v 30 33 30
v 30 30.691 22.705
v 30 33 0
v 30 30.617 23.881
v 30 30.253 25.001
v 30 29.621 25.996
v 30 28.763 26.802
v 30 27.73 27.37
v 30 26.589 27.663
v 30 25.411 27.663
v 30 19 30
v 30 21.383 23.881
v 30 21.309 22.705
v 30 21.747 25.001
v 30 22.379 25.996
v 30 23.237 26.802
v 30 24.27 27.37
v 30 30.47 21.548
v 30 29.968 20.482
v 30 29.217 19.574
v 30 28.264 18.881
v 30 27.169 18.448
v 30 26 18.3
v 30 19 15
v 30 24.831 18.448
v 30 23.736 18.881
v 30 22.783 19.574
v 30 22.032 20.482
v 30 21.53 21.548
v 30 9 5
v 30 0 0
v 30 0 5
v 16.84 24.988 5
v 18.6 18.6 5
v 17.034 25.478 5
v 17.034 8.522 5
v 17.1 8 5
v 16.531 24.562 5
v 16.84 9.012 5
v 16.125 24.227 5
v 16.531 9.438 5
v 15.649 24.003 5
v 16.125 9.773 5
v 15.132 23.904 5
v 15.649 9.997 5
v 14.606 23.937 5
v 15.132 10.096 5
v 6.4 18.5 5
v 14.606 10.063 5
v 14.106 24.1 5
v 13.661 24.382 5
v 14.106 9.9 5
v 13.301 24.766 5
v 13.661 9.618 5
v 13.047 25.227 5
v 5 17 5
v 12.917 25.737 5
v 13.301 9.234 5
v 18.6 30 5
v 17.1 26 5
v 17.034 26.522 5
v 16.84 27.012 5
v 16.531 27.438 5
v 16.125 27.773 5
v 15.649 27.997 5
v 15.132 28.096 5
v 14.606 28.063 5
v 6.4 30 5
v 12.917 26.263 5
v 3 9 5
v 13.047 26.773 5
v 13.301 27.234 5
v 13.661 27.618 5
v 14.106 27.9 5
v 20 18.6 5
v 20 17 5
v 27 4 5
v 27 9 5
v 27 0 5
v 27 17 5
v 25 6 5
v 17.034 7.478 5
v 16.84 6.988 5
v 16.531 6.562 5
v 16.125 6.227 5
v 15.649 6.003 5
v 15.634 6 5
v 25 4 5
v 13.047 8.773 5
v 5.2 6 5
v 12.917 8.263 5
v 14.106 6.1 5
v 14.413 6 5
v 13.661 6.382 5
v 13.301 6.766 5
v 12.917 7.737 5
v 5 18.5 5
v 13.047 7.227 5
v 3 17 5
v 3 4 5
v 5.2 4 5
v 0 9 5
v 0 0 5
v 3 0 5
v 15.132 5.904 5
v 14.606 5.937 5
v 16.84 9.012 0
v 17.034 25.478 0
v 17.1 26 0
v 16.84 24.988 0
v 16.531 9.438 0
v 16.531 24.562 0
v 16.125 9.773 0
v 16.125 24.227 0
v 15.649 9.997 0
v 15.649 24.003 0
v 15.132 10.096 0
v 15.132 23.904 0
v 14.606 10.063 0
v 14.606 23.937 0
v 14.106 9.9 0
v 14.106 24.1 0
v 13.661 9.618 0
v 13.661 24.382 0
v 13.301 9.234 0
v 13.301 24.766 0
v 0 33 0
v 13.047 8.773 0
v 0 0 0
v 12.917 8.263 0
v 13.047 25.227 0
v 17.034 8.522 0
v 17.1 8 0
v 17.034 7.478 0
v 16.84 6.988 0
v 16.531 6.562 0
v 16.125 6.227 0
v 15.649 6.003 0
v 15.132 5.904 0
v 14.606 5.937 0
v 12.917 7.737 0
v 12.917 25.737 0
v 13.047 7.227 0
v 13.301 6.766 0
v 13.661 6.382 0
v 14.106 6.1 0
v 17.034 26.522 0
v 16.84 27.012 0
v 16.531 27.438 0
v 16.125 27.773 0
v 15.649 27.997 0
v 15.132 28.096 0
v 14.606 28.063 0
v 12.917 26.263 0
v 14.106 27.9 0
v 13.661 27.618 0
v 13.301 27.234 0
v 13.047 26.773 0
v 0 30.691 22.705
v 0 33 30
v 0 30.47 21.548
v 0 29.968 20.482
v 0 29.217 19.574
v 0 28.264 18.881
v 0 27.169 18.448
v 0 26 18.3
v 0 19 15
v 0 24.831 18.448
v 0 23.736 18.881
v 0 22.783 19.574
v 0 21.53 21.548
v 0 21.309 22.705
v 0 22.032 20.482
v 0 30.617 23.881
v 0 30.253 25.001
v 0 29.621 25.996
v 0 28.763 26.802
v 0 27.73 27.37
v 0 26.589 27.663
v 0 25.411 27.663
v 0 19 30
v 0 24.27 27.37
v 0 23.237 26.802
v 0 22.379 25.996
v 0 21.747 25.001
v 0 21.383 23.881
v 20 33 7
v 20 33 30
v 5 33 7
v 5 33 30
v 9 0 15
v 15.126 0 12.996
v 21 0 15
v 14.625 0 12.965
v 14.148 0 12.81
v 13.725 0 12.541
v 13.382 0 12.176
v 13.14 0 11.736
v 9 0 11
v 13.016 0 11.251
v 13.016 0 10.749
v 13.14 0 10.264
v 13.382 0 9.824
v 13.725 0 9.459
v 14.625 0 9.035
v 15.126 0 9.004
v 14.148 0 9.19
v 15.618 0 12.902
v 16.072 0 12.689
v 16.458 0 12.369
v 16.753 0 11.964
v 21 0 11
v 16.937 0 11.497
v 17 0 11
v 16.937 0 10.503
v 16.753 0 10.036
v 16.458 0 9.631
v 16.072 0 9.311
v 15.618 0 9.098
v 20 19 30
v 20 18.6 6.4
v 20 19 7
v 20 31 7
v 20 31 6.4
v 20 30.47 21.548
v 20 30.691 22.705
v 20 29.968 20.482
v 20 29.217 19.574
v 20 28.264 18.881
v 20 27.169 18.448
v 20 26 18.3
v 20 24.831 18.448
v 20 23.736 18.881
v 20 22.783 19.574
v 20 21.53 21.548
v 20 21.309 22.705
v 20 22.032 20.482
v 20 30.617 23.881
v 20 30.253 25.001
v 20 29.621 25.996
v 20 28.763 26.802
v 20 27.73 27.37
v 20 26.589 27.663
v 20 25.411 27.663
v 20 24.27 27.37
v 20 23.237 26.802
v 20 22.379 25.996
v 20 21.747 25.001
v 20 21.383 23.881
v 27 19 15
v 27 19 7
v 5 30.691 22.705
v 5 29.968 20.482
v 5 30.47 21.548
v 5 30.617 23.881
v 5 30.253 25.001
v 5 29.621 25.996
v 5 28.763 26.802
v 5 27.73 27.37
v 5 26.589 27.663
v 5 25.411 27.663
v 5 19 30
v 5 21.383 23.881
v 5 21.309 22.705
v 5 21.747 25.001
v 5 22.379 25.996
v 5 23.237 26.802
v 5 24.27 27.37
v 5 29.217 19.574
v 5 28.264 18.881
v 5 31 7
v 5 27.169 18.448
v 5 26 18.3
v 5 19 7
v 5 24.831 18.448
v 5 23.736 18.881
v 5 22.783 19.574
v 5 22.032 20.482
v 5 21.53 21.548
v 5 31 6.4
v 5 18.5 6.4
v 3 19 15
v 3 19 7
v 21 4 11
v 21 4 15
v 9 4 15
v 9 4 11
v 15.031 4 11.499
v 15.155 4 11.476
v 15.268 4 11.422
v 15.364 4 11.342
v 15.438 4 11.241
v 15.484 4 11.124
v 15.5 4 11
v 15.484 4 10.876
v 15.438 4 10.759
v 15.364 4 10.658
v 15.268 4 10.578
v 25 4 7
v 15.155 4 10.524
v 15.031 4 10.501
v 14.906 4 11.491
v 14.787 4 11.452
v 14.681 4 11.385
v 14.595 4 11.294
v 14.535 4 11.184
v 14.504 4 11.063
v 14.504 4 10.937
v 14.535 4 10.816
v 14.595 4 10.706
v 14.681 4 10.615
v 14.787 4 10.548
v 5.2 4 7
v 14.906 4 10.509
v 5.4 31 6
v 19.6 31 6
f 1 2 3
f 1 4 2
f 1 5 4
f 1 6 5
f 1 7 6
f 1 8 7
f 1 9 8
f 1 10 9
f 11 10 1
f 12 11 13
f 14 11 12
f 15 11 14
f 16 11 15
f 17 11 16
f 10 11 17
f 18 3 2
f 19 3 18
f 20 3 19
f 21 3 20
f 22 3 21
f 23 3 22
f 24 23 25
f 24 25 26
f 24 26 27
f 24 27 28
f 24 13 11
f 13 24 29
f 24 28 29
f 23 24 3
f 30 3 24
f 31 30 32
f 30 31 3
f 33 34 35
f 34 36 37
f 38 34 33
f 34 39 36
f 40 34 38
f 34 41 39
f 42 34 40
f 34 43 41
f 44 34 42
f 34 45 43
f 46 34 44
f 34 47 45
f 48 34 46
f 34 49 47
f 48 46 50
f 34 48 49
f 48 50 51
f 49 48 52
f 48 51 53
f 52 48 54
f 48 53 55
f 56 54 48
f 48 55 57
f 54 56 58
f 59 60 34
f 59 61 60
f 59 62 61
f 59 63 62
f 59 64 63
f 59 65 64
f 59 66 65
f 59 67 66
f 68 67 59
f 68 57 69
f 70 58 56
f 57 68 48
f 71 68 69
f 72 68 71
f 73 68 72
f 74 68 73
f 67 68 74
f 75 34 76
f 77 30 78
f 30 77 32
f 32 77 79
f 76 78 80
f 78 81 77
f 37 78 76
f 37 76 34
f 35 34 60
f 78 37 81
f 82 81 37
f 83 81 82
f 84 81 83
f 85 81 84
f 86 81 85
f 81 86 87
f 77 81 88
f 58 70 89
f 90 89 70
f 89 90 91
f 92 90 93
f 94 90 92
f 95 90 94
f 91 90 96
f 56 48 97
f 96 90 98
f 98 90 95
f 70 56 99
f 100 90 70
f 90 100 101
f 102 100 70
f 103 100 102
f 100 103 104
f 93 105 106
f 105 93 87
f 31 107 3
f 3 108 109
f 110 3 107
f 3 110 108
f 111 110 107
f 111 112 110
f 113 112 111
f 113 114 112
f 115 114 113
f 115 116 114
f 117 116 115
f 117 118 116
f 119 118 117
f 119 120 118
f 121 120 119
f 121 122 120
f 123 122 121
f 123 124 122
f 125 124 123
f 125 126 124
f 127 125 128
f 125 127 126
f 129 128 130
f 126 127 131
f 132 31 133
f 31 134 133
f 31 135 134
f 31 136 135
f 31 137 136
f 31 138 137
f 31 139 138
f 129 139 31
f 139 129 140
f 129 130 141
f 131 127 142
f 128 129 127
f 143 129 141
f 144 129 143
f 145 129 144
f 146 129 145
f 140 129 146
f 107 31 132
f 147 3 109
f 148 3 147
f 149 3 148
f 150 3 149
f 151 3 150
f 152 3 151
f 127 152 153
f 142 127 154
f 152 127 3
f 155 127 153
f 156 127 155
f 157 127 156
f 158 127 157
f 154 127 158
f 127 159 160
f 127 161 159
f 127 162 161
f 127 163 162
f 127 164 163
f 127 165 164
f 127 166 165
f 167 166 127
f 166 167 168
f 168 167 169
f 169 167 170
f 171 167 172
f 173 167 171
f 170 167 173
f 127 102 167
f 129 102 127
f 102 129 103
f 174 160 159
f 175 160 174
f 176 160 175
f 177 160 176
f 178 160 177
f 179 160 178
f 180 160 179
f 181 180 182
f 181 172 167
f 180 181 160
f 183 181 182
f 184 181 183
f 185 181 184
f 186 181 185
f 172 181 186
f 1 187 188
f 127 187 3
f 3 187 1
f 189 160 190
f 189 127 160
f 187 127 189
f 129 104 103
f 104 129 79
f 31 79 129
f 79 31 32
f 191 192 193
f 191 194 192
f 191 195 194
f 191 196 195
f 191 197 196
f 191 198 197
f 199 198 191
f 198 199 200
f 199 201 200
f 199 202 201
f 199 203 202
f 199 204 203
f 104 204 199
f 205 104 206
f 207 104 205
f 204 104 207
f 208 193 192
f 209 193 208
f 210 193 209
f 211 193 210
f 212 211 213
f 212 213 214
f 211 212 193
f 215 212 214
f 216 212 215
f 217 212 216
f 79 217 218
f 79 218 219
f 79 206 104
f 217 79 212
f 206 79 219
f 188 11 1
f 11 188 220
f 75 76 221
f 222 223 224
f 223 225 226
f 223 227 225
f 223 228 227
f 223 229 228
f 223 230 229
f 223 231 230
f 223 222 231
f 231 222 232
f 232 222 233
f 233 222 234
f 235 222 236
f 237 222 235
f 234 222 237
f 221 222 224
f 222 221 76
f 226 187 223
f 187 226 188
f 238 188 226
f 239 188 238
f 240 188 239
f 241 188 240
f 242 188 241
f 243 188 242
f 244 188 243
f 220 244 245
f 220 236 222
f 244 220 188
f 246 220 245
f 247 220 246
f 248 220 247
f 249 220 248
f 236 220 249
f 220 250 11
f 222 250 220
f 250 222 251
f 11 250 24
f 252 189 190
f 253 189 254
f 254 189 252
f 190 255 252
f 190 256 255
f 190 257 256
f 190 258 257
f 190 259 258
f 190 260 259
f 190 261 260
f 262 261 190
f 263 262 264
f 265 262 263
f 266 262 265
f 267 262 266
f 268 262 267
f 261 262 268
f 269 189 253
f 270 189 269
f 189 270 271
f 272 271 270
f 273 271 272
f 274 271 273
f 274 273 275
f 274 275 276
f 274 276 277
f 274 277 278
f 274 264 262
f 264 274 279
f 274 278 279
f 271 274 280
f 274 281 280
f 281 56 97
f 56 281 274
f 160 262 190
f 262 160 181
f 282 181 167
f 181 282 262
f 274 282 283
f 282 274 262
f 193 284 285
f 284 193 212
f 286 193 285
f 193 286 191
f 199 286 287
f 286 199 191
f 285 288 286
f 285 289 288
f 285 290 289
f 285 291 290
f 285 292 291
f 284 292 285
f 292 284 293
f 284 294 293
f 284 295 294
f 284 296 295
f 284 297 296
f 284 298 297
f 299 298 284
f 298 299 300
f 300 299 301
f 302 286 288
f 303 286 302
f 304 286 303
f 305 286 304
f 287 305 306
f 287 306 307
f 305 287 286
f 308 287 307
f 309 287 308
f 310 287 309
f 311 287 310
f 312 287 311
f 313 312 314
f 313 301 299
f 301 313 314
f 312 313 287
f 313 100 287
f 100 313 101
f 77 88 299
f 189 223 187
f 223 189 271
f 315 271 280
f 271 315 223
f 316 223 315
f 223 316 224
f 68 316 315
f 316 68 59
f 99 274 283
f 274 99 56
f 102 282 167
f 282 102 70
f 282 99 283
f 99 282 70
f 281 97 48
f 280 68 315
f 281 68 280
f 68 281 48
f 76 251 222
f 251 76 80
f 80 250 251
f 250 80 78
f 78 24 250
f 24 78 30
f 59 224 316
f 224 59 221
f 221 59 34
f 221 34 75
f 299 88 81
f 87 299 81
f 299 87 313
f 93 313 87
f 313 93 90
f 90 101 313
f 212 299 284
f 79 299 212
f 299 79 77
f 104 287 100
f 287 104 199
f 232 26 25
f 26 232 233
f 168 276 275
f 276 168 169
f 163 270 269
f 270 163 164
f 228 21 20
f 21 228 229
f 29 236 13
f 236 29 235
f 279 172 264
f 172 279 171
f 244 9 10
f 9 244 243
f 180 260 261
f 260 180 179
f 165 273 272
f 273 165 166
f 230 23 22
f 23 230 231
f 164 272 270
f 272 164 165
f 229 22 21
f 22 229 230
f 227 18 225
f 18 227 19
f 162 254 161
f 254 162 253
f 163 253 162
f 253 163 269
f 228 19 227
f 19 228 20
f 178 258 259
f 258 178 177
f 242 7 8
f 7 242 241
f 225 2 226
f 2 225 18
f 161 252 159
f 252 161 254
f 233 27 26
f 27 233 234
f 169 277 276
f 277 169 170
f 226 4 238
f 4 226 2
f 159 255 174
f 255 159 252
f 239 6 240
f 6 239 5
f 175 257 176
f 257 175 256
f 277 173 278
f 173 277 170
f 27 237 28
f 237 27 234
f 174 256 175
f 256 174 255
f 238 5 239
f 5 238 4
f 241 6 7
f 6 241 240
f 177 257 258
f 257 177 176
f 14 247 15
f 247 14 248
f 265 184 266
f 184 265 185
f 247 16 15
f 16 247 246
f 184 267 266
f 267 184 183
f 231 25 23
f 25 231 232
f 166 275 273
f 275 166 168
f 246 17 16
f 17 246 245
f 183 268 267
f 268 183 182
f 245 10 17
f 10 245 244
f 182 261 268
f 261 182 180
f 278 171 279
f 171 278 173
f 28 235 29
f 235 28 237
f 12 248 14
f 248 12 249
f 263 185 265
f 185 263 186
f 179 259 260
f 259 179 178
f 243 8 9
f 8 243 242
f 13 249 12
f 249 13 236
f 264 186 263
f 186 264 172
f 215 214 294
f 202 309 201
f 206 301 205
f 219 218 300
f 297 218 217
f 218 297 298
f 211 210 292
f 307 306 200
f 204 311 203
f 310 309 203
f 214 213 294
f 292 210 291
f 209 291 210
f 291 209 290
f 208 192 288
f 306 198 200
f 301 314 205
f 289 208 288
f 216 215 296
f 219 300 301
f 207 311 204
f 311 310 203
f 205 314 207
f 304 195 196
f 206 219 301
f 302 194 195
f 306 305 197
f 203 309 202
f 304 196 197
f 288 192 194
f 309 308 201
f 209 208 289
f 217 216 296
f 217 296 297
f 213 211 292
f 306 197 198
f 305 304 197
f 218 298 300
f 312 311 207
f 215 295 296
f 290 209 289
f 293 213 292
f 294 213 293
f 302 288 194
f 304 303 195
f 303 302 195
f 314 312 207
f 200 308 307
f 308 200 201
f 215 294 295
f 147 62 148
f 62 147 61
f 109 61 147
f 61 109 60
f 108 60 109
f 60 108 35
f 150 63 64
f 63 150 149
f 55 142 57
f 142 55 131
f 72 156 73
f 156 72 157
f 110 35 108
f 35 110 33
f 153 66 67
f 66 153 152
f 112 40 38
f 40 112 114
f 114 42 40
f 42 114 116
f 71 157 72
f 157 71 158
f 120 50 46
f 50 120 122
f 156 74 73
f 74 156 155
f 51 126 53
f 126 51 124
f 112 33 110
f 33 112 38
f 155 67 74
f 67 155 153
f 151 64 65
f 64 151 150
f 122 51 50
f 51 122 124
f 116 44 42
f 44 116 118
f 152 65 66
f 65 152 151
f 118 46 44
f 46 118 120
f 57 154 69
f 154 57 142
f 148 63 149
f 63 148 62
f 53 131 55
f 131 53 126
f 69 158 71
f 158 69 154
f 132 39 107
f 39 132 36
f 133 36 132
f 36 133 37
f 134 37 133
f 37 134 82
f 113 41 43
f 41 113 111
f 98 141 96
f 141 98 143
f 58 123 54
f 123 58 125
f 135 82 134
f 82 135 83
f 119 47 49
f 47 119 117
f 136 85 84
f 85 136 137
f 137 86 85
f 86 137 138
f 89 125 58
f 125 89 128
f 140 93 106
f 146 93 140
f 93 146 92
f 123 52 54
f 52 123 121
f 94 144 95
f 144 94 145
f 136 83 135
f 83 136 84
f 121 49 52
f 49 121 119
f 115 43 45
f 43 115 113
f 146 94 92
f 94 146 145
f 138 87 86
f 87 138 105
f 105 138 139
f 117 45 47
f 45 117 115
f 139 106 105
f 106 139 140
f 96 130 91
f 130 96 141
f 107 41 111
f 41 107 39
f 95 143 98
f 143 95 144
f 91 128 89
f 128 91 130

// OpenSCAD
// use <MCAD/3d_triangle.scad>

$fn = 25;

// defs: b_ = base, a_ = axis towers, in_ = inlet,

// common and input
r_mhole = 2.1;
r_blin = 25.0 / 2;
a_r  = 4.7;
a_w  = 2.0;
in_y =  4;
cf_h = 2.0;

// base
b_x = 30;
b_y = 33;
b_z = 5;
b_cx = b_x / 2;

// axis
a1_x = 10;
a2_x =  5;
a_y  = 2 * ( ceil( a_r + a_w ) );
a_z  = 25;
ax_y = b_y-ceil(a_r+a_w);
ax_z = b_z+a_z-ceil(a_r+a_w);


// inlet
in_x = 12;
// in_y =  4;// upper
in_z = 10;
in_r1 = 2.0;
in_r2 = 0.5;

module conterforce( w, h=1.0 )
{
  polyhedron( points=[[0,-h,0],[0,0,0],[0,0,h],
                      [w,-h,0],[w,0,0],[w,0,h]],
    faces=[  [0,1,2],[0,2,5,3],[3,5,4],
            [0,3,4,1],[1,4,5,2]   ]  );               
}


// #conterforce( b_x, 1 );

difference() {  
  union() {
    cube([b_x,b_y,b_z]);                                         // base
    translate([b_x-a1_x,b_y-a_y,b_z]) cube([a1_x,a_y,a_z] );     // right (1) tower
    translate([       0,b_y-a_y,b_z]) cube([a2_x,a_y,a_z] );     // left (2) tower
    translate([b_cx-in_x/2,0,b_z]) cube([in_x,in_y,in_z] );      // inlet tower
    translate([0,b_y-a_w,b_z]) cube([b_x,a_w,a_w] );             // back bar
    translate([0,b_y-a_w,b_z]) conterforce( b_x, 1.0 );
    translate([0,b_y-a_y,b_z]) conterforce( a2_x, cf_h );  // left cf
    translate([0,b_y-a_y,b_z]) conterforce( 3, 10 );
    translate([a2_x,b_y-0.5-a_y,b_z])
      rotate([0,0,90]) conterforce( a_y-1, 1.4 );
    
    translate([b_x-a1_x,b_y-a_y,b_z]) conterforce( a1_x, cf_h );  // right cf
    translate([b_x-3,b_y-a_y,b_z]) conterforce( 3, 10 );
    translate([b_x-a1_x,b_y-0.8,b_z])
      rotate([0,0,-90]) conterforce( a_y-0.4, 1.4 );
    translate([b_cx+10,in_y,b_z])               // inlet cf
      rotate([0,0,180]) conterforce( 1.65*in_x, cf_h );
    translate([b_cx+in_x/2,0,b_z])
      rotate([0,0,90]) conterforce( in_y, in_x/2 ); 
    translate([b_cx-in_x/2,in_y,b_z])
      rotate([0,0,-90]) conterforce( in_y, in_x/2 ); 
    
    
    
  };
  translate([0,ax_y,ax_z]) rotate([0,90,0]) cylinder( r=a_r, h=b_x );
  translate([b_cx,0,b_z+in_z-in_r1-a_w]) rotate([-90,0,0]) cylinder( r1=in_r1, r2=in_r2, h=in_y );
  
  translate([b_cx,ax_y,0]) cylinder( r=r_mhole, h=b_z );
  translate([b_cx,ax_y-18,0]) cylinder( r=r_mhole, h=b_z );
  
  
}

echo( "a_y= ", a_y, "ax_y= ", ax_y, "ax_z= ", ax_z  );

  
